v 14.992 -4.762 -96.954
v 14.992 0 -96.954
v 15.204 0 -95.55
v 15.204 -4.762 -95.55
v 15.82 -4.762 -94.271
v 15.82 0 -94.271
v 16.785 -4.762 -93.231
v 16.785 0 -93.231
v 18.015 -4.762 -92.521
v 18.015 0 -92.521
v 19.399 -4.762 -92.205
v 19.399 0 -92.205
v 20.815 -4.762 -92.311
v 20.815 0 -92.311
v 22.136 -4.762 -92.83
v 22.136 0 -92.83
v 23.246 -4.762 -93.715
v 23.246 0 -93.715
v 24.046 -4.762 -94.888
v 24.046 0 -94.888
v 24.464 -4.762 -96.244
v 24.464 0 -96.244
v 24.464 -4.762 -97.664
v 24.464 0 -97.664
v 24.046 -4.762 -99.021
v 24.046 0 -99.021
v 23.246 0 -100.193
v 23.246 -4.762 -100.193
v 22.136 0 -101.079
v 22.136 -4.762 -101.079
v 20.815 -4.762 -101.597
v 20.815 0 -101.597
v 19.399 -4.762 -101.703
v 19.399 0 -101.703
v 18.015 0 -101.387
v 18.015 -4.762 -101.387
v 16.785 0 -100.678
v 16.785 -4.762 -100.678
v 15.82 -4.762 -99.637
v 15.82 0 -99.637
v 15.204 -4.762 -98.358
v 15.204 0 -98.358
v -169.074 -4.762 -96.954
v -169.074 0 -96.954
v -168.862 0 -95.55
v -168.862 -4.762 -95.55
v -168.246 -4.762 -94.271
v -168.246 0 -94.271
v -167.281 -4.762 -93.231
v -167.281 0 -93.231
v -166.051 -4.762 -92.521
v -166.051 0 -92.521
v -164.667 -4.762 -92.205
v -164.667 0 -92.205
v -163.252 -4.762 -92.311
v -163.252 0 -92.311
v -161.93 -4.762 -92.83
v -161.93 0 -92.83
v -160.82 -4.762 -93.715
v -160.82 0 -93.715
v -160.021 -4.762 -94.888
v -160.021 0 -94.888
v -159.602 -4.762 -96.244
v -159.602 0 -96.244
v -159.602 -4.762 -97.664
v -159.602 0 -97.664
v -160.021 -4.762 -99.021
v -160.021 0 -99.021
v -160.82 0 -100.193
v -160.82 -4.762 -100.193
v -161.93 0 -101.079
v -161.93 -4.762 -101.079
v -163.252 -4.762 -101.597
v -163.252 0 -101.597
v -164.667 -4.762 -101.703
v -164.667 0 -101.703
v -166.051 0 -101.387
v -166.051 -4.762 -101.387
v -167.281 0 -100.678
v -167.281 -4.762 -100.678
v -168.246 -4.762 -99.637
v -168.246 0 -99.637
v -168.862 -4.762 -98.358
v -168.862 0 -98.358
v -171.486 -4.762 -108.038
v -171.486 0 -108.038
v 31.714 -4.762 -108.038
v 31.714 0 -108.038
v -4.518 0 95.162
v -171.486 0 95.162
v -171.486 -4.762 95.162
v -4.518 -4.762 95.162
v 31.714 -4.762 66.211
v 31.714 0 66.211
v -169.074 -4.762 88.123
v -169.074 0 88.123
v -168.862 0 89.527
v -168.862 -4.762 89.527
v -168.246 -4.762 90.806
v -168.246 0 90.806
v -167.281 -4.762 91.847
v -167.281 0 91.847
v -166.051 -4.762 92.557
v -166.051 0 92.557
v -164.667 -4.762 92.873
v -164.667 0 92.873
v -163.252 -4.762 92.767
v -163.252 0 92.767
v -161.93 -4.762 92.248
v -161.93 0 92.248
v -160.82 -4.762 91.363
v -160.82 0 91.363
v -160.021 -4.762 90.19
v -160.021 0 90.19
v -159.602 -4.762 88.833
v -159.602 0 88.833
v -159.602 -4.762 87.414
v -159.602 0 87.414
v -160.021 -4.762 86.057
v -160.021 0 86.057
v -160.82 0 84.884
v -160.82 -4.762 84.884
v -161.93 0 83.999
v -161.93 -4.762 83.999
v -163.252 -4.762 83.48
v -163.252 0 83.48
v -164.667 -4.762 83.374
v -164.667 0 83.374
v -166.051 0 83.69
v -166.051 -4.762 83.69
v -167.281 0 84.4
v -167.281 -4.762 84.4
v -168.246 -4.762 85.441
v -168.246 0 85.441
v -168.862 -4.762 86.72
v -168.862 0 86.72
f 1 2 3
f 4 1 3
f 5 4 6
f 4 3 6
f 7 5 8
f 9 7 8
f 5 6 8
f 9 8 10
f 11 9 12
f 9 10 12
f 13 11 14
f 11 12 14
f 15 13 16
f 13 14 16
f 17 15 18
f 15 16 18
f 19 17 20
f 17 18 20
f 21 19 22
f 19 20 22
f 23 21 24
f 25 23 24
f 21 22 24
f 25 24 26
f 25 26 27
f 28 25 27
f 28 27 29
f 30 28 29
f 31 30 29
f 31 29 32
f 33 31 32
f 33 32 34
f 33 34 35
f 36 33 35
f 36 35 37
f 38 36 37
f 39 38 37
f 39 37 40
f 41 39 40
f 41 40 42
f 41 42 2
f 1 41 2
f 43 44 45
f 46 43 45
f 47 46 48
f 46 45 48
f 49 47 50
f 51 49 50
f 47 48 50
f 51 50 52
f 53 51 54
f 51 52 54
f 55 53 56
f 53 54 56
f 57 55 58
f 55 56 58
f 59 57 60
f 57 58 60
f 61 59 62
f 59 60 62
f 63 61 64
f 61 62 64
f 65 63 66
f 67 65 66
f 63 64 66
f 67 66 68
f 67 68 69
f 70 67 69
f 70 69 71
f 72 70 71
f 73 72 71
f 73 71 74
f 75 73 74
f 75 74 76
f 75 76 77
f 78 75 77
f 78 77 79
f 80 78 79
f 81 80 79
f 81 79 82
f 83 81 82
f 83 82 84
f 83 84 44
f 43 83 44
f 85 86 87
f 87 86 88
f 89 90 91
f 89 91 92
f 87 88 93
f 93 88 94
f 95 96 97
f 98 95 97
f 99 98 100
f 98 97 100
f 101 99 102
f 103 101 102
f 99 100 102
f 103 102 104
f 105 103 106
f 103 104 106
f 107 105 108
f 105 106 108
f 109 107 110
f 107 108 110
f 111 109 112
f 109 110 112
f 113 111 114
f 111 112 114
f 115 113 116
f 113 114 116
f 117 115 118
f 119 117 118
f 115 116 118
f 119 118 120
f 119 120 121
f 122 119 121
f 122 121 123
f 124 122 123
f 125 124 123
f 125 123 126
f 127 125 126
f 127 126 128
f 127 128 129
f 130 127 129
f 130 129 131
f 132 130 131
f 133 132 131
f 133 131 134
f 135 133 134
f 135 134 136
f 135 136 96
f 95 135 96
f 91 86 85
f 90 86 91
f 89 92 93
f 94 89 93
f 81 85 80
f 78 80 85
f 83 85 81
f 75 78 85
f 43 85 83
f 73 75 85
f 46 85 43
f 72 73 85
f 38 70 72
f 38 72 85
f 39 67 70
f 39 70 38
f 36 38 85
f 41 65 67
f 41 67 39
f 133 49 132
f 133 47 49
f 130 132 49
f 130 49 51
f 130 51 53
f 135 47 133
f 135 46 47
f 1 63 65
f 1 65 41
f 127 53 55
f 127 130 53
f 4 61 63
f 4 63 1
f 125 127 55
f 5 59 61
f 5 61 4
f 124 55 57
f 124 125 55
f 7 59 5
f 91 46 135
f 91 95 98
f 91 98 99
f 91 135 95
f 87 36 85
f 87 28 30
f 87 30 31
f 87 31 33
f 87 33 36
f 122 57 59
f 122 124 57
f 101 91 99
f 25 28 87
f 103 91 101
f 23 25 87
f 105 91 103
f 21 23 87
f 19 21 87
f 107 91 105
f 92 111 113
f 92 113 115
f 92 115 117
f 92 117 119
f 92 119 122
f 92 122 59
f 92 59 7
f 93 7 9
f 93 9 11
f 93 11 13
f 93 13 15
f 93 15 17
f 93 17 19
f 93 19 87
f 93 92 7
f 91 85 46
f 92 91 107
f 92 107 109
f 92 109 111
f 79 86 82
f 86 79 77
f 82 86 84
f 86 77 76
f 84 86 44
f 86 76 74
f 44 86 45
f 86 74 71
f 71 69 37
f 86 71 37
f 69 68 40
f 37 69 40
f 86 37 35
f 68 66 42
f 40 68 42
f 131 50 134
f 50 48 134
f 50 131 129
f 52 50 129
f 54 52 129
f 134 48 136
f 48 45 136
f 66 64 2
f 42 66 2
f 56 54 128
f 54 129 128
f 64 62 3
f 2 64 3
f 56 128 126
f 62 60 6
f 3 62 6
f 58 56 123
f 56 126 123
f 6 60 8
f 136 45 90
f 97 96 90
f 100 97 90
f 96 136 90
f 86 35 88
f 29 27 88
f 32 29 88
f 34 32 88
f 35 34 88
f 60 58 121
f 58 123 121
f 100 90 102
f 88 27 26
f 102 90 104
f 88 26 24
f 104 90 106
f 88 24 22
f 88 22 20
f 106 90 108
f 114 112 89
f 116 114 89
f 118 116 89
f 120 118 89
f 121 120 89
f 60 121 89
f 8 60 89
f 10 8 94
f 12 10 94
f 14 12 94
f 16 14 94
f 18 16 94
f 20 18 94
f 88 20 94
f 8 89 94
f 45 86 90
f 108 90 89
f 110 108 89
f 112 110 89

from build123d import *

# Parameters (mm, degrees)
F0_W     = 203.2
F0_H     = 203.2
F1_DEPTH = 4.7625
F3_DEPTH = 25.4
F5_D     = 9.525


with BuildPart() as f1:
    # F0 (on Front) → F1 (new body)
    with BuildSketch(Plane.XZ):
        with Locations((-69.8862, -6.438033)):
            Rectangle(F0_W, F0_H)
    extrude(amount=F1_DEPTH)

    # F2 (on face) → F3 (cut)
    with BuildSketch(Plane.XZ.offset(4.7625)):
        Polygon((31.7138, 95.161967), (-4.51766, 95.161967), (31.7138, 66.210844), align=None)
    extrude(amount=-F3_DEPTH, mode=Mode.SUBTRACT)

    # F5 (through all)
    with Locations(Plane.XZ.offset(4.7625)):
        with Locations((-164.311469, 88.123493), (-164.311469, -96.954145), (19.754818, -96.954145)):
            Hole(F5_D / 2)


solid = f1.part
